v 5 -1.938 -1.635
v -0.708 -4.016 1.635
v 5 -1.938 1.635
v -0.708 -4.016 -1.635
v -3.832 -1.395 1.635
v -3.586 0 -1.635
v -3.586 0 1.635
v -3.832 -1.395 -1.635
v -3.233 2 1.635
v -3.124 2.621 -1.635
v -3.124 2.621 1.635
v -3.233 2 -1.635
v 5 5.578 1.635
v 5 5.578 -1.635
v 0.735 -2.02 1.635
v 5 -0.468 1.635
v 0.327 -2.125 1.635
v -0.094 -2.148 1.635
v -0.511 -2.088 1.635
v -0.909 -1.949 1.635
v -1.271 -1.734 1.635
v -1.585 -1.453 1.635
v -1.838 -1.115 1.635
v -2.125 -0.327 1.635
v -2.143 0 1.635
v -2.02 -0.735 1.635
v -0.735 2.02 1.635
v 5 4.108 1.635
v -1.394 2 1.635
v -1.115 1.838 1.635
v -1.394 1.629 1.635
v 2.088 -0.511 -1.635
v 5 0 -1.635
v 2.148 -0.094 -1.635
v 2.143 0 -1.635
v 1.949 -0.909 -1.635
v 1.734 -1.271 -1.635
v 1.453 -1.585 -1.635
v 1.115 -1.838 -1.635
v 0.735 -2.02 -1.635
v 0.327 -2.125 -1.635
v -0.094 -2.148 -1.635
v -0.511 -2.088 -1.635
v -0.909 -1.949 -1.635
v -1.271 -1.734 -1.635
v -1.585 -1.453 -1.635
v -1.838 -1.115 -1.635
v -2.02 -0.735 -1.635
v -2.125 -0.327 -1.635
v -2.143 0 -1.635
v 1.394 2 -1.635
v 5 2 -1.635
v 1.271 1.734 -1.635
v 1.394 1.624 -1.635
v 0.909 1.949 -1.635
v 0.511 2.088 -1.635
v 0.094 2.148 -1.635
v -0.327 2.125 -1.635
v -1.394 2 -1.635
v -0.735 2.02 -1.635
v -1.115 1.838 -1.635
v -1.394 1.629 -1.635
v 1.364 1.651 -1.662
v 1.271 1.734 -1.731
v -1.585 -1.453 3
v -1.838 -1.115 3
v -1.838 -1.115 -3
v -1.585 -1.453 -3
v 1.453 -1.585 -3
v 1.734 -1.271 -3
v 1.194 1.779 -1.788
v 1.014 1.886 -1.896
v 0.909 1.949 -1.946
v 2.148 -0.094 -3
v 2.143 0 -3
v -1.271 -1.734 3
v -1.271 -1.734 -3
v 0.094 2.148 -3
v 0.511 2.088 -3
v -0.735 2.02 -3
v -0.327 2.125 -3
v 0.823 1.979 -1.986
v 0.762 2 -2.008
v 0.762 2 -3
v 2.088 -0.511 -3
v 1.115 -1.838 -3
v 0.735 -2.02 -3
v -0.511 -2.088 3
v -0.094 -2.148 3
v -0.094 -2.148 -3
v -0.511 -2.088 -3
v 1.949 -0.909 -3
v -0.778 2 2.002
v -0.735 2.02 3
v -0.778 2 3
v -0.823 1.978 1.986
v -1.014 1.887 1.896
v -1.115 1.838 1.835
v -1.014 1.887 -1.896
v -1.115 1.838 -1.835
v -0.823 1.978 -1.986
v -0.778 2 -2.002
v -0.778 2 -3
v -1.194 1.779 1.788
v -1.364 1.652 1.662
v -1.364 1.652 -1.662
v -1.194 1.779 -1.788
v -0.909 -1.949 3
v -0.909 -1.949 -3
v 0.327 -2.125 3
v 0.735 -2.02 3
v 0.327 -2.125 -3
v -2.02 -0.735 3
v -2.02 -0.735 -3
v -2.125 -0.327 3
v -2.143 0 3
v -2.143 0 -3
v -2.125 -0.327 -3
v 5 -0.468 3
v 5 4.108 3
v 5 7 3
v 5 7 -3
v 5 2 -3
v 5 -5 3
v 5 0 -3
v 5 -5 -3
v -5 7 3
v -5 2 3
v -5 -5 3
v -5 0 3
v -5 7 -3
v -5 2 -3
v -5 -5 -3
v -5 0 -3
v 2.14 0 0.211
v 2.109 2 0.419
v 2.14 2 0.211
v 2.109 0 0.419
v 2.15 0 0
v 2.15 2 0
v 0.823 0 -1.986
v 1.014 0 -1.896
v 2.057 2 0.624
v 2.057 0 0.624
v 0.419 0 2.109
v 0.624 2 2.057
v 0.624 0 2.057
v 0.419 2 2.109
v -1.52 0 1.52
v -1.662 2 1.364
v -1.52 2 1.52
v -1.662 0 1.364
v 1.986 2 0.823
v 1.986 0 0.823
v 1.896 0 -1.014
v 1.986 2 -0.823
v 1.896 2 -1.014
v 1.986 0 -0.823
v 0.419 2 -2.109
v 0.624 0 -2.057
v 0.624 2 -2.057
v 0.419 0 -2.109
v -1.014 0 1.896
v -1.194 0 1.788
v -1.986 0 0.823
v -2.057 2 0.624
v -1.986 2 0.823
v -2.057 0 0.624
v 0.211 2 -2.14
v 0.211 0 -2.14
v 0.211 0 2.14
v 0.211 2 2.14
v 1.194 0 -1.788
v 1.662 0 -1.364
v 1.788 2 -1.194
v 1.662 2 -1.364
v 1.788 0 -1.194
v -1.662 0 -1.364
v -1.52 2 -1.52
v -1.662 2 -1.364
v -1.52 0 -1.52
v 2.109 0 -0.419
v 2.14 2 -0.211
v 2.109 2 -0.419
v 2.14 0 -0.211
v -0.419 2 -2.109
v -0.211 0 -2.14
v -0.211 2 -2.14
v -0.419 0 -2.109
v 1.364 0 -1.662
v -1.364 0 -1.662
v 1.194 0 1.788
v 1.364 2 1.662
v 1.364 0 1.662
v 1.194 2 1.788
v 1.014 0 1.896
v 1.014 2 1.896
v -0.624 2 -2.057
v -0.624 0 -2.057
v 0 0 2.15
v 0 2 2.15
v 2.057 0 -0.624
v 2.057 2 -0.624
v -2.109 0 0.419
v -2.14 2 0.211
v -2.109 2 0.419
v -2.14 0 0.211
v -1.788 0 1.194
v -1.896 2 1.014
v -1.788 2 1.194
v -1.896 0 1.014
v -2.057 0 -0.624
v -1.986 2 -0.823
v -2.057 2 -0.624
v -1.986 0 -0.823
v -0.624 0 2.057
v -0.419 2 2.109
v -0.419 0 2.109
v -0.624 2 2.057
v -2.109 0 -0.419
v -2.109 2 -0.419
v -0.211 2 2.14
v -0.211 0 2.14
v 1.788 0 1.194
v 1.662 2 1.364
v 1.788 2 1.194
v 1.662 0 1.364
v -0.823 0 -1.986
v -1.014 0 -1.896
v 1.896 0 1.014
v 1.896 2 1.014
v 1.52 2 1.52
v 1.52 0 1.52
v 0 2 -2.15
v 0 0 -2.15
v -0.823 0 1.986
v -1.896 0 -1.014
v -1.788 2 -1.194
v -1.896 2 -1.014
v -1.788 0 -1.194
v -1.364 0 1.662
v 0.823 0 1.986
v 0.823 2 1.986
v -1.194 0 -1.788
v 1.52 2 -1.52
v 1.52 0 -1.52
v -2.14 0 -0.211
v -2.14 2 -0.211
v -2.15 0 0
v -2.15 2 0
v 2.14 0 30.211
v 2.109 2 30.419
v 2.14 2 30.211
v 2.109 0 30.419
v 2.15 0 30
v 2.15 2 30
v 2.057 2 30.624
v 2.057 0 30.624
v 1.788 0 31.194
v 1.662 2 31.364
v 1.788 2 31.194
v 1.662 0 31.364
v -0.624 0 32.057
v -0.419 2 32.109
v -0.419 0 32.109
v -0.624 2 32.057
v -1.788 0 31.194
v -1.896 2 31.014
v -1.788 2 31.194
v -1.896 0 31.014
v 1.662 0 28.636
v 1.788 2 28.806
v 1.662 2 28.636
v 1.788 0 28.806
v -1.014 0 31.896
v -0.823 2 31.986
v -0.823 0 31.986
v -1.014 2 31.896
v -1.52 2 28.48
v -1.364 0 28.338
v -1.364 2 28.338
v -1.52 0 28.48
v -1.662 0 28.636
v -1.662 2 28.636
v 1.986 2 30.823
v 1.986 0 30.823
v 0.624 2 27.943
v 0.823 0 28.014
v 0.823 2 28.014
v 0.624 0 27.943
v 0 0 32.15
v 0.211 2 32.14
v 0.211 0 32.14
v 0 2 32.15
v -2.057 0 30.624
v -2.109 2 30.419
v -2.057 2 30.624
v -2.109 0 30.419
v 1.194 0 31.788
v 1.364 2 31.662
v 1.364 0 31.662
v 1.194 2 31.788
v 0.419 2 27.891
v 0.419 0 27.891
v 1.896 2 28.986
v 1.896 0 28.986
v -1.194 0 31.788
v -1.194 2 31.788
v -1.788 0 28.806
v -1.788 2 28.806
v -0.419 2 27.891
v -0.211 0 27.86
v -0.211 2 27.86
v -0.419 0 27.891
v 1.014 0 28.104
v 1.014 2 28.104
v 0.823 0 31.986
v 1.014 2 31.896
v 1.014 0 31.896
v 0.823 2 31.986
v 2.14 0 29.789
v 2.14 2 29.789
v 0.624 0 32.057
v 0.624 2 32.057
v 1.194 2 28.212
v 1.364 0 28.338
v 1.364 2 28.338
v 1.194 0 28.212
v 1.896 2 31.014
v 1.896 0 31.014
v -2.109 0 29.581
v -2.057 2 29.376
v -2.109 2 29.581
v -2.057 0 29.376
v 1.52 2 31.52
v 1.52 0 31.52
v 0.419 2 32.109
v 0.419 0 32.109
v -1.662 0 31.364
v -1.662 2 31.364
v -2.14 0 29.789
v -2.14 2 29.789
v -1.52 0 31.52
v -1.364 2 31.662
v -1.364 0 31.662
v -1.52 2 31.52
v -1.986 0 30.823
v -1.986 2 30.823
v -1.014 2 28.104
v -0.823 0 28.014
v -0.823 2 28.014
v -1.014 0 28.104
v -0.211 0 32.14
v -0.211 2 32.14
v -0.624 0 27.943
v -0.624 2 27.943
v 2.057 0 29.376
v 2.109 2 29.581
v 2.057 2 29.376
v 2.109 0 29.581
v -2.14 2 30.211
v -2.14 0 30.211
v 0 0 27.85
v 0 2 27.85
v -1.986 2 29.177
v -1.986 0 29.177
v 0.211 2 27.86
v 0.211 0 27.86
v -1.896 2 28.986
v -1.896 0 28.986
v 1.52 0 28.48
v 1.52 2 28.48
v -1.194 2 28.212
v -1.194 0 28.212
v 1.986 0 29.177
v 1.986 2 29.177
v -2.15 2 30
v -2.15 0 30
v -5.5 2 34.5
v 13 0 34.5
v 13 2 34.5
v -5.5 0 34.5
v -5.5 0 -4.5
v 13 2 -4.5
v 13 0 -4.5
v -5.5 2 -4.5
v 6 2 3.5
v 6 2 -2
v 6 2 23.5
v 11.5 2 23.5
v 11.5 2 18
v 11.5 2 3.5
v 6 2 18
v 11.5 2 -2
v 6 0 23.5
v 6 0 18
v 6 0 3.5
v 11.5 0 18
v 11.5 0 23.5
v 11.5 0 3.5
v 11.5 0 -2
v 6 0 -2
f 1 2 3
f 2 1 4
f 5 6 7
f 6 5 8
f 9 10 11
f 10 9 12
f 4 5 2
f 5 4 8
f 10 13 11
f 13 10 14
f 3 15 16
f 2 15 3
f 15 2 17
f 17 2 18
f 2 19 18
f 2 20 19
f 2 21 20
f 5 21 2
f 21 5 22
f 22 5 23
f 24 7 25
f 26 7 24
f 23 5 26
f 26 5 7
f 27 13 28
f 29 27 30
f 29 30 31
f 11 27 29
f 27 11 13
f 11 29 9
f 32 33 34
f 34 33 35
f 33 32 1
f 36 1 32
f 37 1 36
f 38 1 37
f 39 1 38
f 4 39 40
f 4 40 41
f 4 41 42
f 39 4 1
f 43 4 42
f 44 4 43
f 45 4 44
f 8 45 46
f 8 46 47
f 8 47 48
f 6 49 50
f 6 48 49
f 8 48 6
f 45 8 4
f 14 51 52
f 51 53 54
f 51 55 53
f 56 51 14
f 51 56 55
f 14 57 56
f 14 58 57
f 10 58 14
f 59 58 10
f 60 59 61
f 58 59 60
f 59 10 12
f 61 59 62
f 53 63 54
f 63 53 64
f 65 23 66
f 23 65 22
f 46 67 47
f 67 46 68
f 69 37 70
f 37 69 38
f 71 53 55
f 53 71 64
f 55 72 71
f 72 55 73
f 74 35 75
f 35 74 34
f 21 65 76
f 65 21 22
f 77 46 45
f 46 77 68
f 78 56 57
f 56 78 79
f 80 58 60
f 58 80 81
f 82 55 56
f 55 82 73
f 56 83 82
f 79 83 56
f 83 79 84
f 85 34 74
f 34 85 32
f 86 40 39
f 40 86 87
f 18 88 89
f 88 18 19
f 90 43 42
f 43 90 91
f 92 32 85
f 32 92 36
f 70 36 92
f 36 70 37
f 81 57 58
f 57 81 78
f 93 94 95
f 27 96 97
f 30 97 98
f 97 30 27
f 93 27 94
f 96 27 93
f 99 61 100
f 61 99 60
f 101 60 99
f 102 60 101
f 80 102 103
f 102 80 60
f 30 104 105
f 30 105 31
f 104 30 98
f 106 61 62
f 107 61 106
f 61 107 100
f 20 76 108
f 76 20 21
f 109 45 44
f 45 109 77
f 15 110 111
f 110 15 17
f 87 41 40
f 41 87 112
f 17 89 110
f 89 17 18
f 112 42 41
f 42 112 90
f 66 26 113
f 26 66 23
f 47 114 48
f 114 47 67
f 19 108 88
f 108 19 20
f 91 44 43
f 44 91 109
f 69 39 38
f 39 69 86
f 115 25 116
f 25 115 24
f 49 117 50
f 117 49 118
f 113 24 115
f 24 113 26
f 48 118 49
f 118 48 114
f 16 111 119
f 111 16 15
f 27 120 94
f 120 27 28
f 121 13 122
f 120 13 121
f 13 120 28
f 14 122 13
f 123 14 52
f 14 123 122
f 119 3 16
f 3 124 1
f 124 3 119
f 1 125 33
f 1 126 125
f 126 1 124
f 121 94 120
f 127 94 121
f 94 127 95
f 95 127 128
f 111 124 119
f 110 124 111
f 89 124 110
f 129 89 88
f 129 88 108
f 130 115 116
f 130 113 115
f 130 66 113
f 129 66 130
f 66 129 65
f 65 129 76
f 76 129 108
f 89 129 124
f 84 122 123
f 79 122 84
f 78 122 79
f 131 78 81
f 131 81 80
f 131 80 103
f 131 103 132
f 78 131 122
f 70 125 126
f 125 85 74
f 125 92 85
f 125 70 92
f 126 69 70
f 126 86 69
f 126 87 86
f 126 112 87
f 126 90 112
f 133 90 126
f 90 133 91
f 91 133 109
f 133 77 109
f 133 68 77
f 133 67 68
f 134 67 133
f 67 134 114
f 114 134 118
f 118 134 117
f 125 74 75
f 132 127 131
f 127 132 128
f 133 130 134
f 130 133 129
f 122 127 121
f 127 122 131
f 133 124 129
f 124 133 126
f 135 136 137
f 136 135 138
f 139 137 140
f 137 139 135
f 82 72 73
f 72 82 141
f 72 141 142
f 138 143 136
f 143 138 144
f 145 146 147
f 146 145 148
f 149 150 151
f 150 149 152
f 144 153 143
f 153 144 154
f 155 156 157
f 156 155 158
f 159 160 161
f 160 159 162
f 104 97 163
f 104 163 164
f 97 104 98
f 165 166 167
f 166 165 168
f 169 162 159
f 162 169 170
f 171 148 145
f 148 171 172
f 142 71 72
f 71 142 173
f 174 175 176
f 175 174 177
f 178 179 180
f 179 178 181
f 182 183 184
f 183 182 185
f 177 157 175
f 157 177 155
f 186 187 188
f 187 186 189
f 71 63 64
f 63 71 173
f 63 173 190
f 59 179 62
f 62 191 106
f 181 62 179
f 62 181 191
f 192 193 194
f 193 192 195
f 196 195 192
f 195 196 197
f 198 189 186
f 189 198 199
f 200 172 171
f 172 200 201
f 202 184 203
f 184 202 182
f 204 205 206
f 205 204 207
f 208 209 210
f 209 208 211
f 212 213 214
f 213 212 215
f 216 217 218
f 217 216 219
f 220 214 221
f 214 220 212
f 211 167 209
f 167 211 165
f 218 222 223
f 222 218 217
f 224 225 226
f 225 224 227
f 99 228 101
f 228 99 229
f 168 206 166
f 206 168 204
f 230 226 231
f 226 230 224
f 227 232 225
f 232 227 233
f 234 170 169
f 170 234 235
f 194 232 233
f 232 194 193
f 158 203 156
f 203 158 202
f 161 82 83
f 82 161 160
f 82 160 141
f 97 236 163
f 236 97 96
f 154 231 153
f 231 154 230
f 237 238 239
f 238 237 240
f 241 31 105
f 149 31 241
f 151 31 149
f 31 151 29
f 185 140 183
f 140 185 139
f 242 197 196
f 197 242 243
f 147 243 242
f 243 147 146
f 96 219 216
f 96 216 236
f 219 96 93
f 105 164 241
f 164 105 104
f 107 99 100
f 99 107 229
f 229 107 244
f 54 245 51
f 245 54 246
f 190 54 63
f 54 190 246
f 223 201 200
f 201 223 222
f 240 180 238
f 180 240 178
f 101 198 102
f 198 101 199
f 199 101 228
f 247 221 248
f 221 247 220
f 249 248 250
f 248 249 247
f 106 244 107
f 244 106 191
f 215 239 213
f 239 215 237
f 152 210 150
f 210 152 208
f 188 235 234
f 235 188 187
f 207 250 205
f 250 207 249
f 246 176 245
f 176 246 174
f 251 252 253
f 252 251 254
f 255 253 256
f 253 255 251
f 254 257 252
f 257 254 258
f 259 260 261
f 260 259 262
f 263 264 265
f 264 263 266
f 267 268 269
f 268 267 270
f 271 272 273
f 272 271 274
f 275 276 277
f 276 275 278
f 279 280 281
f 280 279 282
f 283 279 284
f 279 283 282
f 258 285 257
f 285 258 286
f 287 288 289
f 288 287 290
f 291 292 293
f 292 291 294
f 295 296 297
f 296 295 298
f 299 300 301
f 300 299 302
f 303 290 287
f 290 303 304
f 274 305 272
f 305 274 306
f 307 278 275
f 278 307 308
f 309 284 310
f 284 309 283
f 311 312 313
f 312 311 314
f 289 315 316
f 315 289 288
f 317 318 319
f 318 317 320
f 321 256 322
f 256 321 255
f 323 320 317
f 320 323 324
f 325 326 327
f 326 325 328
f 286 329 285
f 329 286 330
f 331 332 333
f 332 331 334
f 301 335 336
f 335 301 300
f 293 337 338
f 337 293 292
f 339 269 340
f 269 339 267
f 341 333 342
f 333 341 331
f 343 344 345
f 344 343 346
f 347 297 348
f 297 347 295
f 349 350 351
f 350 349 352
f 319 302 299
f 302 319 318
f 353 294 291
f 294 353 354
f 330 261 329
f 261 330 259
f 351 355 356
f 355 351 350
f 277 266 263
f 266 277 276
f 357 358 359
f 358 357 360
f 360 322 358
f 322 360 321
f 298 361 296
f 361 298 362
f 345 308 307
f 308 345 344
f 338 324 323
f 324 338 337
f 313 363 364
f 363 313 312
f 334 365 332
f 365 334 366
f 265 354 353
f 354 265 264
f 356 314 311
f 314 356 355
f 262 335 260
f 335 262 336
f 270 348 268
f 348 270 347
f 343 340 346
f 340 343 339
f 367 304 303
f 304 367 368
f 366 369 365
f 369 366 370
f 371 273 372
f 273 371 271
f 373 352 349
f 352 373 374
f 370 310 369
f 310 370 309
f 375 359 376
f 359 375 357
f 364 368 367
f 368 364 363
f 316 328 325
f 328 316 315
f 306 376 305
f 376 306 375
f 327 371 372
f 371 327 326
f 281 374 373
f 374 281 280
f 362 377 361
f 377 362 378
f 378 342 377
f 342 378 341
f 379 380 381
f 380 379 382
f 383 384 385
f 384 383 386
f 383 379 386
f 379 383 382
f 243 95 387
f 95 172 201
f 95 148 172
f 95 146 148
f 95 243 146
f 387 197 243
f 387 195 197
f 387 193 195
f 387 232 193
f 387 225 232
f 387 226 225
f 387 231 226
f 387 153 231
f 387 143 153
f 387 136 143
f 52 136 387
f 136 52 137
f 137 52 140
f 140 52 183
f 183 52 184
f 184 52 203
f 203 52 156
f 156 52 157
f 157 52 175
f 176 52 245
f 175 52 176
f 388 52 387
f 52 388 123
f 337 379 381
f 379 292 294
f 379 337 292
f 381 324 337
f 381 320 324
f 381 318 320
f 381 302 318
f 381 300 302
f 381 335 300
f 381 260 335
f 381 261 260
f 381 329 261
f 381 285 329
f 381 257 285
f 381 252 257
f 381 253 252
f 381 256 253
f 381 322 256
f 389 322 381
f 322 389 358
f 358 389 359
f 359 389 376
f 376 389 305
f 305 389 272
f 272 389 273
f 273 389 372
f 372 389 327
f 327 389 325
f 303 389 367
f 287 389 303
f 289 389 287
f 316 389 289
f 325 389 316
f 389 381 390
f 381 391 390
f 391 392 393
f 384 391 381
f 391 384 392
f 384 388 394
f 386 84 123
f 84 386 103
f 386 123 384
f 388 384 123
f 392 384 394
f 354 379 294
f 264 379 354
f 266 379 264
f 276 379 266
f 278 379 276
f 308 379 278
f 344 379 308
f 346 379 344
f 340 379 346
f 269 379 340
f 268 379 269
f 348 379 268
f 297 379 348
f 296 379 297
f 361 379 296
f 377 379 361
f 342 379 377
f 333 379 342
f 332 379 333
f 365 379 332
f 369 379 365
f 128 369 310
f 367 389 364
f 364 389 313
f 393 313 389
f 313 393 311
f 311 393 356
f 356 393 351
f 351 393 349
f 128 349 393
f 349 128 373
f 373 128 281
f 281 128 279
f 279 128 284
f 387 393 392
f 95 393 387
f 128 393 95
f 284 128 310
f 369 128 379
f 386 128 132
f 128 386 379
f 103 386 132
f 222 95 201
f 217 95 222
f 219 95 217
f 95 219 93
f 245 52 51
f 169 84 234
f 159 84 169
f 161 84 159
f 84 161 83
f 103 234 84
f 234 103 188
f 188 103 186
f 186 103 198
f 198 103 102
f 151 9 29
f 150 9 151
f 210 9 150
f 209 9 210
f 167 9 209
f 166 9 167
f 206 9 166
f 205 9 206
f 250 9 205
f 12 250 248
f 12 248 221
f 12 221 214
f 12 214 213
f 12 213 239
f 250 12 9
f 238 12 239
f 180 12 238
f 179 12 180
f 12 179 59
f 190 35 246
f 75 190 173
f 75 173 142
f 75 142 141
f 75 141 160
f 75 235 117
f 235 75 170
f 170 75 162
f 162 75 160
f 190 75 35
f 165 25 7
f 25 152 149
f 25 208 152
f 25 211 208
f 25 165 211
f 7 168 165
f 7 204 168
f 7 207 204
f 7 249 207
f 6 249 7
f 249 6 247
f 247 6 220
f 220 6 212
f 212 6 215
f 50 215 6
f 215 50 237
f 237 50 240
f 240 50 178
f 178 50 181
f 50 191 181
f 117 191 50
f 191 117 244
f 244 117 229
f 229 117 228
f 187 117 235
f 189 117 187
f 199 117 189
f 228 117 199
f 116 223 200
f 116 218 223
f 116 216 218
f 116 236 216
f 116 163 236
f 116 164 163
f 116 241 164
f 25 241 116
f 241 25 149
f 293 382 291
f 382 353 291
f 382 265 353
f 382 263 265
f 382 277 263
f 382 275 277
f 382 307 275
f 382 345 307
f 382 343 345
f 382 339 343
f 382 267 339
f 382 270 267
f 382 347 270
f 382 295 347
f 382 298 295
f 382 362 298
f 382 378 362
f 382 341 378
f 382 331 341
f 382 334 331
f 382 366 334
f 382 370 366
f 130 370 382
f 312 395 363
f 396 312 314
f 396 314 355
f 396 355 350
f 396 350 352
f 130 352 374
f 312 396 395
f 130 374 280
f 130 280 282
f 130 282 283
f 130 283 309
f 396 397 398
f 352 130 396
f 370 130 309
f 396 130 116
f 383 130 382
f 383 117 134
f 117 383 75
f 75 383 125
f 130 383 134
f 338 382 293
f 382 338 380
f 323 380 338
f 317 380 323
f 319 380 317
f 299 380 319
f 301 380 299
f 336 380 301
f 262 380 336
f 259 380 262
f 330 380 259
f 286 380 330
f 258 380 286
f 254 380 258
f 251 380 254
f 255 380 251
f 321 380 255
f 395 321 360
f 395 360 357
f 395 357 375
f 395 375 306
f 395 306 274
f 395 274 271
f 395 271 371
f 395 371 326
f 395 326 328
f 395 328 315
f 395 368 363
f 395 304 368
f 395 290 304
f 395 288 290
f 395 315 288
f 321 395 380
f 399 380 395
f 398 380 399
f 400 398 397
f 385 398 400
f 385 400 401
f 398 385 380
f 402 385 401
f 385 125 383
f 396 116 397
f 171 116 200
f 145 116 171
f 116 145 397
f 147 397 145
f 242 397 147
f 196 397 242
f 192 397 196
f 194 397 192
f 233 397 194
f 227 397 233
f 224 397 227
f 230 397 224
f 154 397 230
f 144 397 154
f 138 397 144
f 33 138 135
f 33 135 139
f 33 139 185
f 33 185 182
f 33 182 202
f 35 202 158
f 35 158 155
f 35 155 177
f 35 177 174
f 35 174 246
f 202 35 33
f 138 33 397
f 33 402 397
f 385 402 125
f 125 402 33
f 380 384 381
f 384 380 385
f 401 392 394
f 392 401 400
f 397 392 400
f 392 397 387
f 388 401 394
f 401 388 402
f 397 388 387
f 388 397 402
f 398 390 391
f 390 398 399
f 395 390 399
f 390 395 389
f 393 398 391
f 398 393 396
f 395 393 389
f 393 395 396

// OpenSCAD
// file: rockpro.scad
rockProMountDeltaXY = [[0,0,0], [116.5,0,0], [116.5,71.0,0], [0,71.0,0]];


module rockProMountPoints(cylHeight, cylRad1, cylRad2, cylFn, center) {
  
  for (i=[0:3]) {
    p = rockProMountDeltaXY[i];    
    translate(v=[p[0], p[1], p[2]])
    cylinder(r1=cylRad1, r2=cylRad2, h=cylHeight, $fn=cylFn, center=center);
  }
  
}


//rockProMountPoints(10,2,64, true);
// file: ../rack/screws.scad
/* Some common screw dimensions */


inf = 400; // basically infinity

/********************************************************************************/
// M3 dimensions

m3HoleRadiusSlack = 0.15;
m3Diameter = 3.0;
m3Radius = m3Diameter/2.0;

m3RadiusSlacked = m3Radius + m3HoleRadiusSlack;

// legacy TODO: replace
m3ptr = m3RadiusSlacked;

// NUTS!
m3HexNutWidthAcrossFlats = 5.41;
m3HexNutWidthAcrossCorners = FtoG(m3HexNutWidthAcrossFlats);

m3HexNutThickness = 2.18;

module m3HexNutPocketNegative() {
  hexNutPocketNegative(m3RadiusSlacked,
                       m3HexNutWidthAcrossCorners/2 + 0.1,
                       m3HexNutThickness + 0.2);
}


// TODO: remove test

*difference() {
  cube(size=[8,12,5], center=true);

  rotate(a=[0,0,20])
  m3HexNutPocketNegative();
}

*m3HexNutPocketNegative();


/********************************************************************************/
// M4 dimensions

m4HoleRadiusSlack = 0.15;
m4Diameter = 4.0;
m4Radius = m4Diameter/2.0;
m4RadiusSlacked = m4Radius + m4HoleRadiusSlack;

m4HexNutWidthAcrossFlats = 6.89;
m4HexNutWidthAcrossCorners = FtoG(m4HexNutWidthAcrossFlats);

m4HexNutThickness = 3.07;

module m4HexNutPocketNegative() {
  hexNutPocketNegative(m4RadiusSlacked,
                       m4HexNutWidthAcrossCorners/2 + 0.1,
                       m4HexNutThickness + 0.2);
}


// TODO: remove test

difference() {
  translate(v=[0,1,0])
  cube(size=[10,12,6], center=true);

  rotate(a=[0,0,20])
  m4HexNutPocketNegative();
}

*m4HexNutPocketNegative();

/********************************************************************************/

// Convert a regular hexagon widthAcrossFlats to widthAcrossCorners
function FtoG(widthAcrossFlats) = widthAcrossFlats * (2/sqrt(3));  

// Convert a regular hexagon widthAcrossCorners to widthAcrossFlats
function GtoF(widthAcrossCorners) =  widthAcrossCorners * (sqrt(3)/2);


module hexNutPocketNegative(
  innerRadius,
  widthAcrossCorners,
  thickness)
{

  union() {

    hull() {
      // hexagonal cylinder representing where the nut should fit
      cylinder(r=widthAcrossCorners, h=thickness, center=true, $fn=6);

      // negative volume for sliding in the nut
      translate(v=[inf,0,0])
      cylinder(r=widthAcrossCorners, h=thickness, center=true, $fn=6);
    }

    // negative volume for screw lead
    translate(v=[0,0,-10])
    cylinder(r=innerRadius, h = inf, $fn=32);

    hull() {
     translate(v=[inf,0,0])
       cylinder(r=innerRadius, h = inf, $fn=32);
     cylinder(r=innerRadius, h = inf, $fn=32);
    }
  }
}
// file: ../common.scad
/* Some initial configurations and commonly used variables
   plus functions
*/

$fn=64;


eps=0.01;
// file: ../rack-tray/rack-tray.scad
eps=0.01;
vU = 2;
uHeight = 10;

plateScrewDiffV = uHeight*vU;
plateScrewDiffH = 180;

plateScrewToHEdge = 4.5;
plateScrewToVEdge = 5.5;

frontPlateThickness = 3;

frontPlateV = plateScrewDiffV + 2*plateScrewToHEdge;
frontPlateH = plateScrewDiffH + 2*plateScrewToVEdge;

//////////////////////////////////////////////////////

trayOuterHeight = 28;
trayOuterWidth = 168;
trayOuterDepth = 130;

trayBottomThickness = 2;
traySideThickness = 3;
trayFrontThickness = 2;


trayInnerWidth = trayOuterWidth - 2*traySideThickness;
trayInnerDepth = trayOuterDepth - trayFrontThickness;
trayInnerHeight = trayOuterHeight - trayBottomThickness;

module _trayBody() {

    difference() {
        cube(size = [trayOuterWidth, trayOuterDepth, trayOuterHeight]);

        union() {
            translate(v = [traySideThickness, trayFrontThickness, trayBottomThickness])
                cube(size = [trayInnerWidth + eps, trayInnerDepth + eps, trayInnerHeight + eps]);


            translate(v=[0,0, trayOuterHeight])
                rotate(a=[-atan(trayInnerHeight/trayOuterDepth),0,0])
                    cube(size=[trayOuterWidth+eps, 2*trayOuterDepth+eps, trayInnerHeight+eps]);

            translate(v=[5+traySideThickness,0,trayBottomThickness])
            cube(size=[trayInnerWidth-10, trayFrontThickness+eps, trayOuterHeight]);
        }
    }
}

// todo make a nice module for this (triangular prism)
module _sideHole_N() {
    scale(v=[2,0.65,0.65])
        difference () {
            cube(size = [trayOuterWidth, trayOuterDepth, trayOuterHeight]);
            translate(v = [0, 0, trayOuterHeight])
                rotate(a = [- atan(trayInnerHeight / trayOuterDepth), 0, 0])
                    cube(size = [trayOuterWidth + eps, 2 * trayOuterDepth + eps, trayInnerHeight + eps]);
        }
}


module trayBody() {
    union() {
        difference() {
            _trayBody();
            union() {
                // bottom holes
                for (i = [0:7]) {
                    translate(v = [35, i * 15 + 10, - eps])
                        *cube(size = [100, 5, 10]);
                }
                translate(v=[-10,5,5])
                _sideHole_N();
            }
        }

        // lugs for front
        translate(v=[0,-2,0])
            cube(size=[5,2,5]);
        translate(v=[trayOuterWidth-5,-2,0])
            cube(size=[5,2,5]);

        translate(v=[0,-2,20])
            cube(size=[5,2,5]);
        translate(v=[trayOuterWidth-5,-2,20])
            cube(size=[5,2,5]);
    }
}




//trayBody();
// main file
include <../rack-tray/rack-tray.scad>
include <../common.scad>
include <../rack/screws.scad>
include <./rockpro.scad>

vU = 3;
uHeight = 10;

plateScrewDiffV = uHeight*vU;
plateScrewDiffH = 180;

plateScrewToHEdge = 4.5;
plateScrewToVEdge = 5.5;

frontPlateThickness = 2;

frontPlateV = plateScrewDiffV + 2*plateScrewToHEdge;
frontPlateH = plateScrewDiffH + 2*plateScrewToVEdge;


plateScrewToBoxMin = 6;

module _frontPlateBody() {
    translate(v=[-plateScrewToVEdge,0,-plateScrewToHEdge])
        cube(size=[frontPlateH,frontPlateThickness,frontPlateV]);
}

module _plateHole() {
    rotate(a=[90,0,0])
        cylinder(r=m4RadiusSlacked, h=inf, center=true);
}


module frontPlate() {

    difference() {
        _frontPlateBody();

        union() {
            // TODO: introduce helper modules for this pattern
            _plateHole();

            translate(v=[plateScrewDiffH,0,0])
                _plateHole();

            translate(v=[0,0,plateScrewDiffV])
                _plateHole();

            translate(v=[plateScrewDiffH,0,plateScrewDiffV])
                _plateHole();
        }
    }
}

difference() {
    frontPlate();
    union() {
        translate(v = [13, 0, - 10])
            cube(size = [300, 100, 100]);

        translate(v=[6,0,-2])
            cube(size=[5.5,5.5,5.5]);

        translate(v=[6,0,20-2])
            cube(size=[5.5,5.5,5.5]);
    }
}



// todo use library constants
// TODO these risers are prone to snapping off
module screwRiser(height) {
    difference() {
        cylinder(d=5, h=height, $fn=64);
        cylinder(d=2.88, h=height, $fn=64);
    }
}

module mountPoints_N(cylHeight, cylRad1, cylRad2, cylFn, center) {
    for (i=[0:3]) {
        p = mountPoints[i];
        translate(v=[p[0], p[1], p[2]])
            cylinder(r1=cylRad1, r2=cylRad2, h=cylHeight, $fn=cylFn, center=center);
    }
}

module rockProScrewMounts() {
    for (i=[0:3]) {
        p = mountPoints[i];
        translate(v=[p[0], p[1], p[2]])
            screwRiser(5);
    }
}


module rockProDualTray() {


    trayBody();
    translate(v=[9,8,trayBottomThickness])
        rockProScrewMounts();

    translate(v=[9 + pcbDimensions[0],8,trayBottomThickness])
        rockProScrewMounts();

}

*difference() {
    rockProDualTray();
    // file specific bottom holes
    union() {
        translate(v = [10, 15, 0])
            minkowski() {
                cube(size = [69, 100, 5]);
                cylinder(r = 1);
            }

        translate(v=[88,15,0])
            minkowski() {
                cube(size = [69, 100, 5]);
                cylinder(r=1);
            }
    }
}
